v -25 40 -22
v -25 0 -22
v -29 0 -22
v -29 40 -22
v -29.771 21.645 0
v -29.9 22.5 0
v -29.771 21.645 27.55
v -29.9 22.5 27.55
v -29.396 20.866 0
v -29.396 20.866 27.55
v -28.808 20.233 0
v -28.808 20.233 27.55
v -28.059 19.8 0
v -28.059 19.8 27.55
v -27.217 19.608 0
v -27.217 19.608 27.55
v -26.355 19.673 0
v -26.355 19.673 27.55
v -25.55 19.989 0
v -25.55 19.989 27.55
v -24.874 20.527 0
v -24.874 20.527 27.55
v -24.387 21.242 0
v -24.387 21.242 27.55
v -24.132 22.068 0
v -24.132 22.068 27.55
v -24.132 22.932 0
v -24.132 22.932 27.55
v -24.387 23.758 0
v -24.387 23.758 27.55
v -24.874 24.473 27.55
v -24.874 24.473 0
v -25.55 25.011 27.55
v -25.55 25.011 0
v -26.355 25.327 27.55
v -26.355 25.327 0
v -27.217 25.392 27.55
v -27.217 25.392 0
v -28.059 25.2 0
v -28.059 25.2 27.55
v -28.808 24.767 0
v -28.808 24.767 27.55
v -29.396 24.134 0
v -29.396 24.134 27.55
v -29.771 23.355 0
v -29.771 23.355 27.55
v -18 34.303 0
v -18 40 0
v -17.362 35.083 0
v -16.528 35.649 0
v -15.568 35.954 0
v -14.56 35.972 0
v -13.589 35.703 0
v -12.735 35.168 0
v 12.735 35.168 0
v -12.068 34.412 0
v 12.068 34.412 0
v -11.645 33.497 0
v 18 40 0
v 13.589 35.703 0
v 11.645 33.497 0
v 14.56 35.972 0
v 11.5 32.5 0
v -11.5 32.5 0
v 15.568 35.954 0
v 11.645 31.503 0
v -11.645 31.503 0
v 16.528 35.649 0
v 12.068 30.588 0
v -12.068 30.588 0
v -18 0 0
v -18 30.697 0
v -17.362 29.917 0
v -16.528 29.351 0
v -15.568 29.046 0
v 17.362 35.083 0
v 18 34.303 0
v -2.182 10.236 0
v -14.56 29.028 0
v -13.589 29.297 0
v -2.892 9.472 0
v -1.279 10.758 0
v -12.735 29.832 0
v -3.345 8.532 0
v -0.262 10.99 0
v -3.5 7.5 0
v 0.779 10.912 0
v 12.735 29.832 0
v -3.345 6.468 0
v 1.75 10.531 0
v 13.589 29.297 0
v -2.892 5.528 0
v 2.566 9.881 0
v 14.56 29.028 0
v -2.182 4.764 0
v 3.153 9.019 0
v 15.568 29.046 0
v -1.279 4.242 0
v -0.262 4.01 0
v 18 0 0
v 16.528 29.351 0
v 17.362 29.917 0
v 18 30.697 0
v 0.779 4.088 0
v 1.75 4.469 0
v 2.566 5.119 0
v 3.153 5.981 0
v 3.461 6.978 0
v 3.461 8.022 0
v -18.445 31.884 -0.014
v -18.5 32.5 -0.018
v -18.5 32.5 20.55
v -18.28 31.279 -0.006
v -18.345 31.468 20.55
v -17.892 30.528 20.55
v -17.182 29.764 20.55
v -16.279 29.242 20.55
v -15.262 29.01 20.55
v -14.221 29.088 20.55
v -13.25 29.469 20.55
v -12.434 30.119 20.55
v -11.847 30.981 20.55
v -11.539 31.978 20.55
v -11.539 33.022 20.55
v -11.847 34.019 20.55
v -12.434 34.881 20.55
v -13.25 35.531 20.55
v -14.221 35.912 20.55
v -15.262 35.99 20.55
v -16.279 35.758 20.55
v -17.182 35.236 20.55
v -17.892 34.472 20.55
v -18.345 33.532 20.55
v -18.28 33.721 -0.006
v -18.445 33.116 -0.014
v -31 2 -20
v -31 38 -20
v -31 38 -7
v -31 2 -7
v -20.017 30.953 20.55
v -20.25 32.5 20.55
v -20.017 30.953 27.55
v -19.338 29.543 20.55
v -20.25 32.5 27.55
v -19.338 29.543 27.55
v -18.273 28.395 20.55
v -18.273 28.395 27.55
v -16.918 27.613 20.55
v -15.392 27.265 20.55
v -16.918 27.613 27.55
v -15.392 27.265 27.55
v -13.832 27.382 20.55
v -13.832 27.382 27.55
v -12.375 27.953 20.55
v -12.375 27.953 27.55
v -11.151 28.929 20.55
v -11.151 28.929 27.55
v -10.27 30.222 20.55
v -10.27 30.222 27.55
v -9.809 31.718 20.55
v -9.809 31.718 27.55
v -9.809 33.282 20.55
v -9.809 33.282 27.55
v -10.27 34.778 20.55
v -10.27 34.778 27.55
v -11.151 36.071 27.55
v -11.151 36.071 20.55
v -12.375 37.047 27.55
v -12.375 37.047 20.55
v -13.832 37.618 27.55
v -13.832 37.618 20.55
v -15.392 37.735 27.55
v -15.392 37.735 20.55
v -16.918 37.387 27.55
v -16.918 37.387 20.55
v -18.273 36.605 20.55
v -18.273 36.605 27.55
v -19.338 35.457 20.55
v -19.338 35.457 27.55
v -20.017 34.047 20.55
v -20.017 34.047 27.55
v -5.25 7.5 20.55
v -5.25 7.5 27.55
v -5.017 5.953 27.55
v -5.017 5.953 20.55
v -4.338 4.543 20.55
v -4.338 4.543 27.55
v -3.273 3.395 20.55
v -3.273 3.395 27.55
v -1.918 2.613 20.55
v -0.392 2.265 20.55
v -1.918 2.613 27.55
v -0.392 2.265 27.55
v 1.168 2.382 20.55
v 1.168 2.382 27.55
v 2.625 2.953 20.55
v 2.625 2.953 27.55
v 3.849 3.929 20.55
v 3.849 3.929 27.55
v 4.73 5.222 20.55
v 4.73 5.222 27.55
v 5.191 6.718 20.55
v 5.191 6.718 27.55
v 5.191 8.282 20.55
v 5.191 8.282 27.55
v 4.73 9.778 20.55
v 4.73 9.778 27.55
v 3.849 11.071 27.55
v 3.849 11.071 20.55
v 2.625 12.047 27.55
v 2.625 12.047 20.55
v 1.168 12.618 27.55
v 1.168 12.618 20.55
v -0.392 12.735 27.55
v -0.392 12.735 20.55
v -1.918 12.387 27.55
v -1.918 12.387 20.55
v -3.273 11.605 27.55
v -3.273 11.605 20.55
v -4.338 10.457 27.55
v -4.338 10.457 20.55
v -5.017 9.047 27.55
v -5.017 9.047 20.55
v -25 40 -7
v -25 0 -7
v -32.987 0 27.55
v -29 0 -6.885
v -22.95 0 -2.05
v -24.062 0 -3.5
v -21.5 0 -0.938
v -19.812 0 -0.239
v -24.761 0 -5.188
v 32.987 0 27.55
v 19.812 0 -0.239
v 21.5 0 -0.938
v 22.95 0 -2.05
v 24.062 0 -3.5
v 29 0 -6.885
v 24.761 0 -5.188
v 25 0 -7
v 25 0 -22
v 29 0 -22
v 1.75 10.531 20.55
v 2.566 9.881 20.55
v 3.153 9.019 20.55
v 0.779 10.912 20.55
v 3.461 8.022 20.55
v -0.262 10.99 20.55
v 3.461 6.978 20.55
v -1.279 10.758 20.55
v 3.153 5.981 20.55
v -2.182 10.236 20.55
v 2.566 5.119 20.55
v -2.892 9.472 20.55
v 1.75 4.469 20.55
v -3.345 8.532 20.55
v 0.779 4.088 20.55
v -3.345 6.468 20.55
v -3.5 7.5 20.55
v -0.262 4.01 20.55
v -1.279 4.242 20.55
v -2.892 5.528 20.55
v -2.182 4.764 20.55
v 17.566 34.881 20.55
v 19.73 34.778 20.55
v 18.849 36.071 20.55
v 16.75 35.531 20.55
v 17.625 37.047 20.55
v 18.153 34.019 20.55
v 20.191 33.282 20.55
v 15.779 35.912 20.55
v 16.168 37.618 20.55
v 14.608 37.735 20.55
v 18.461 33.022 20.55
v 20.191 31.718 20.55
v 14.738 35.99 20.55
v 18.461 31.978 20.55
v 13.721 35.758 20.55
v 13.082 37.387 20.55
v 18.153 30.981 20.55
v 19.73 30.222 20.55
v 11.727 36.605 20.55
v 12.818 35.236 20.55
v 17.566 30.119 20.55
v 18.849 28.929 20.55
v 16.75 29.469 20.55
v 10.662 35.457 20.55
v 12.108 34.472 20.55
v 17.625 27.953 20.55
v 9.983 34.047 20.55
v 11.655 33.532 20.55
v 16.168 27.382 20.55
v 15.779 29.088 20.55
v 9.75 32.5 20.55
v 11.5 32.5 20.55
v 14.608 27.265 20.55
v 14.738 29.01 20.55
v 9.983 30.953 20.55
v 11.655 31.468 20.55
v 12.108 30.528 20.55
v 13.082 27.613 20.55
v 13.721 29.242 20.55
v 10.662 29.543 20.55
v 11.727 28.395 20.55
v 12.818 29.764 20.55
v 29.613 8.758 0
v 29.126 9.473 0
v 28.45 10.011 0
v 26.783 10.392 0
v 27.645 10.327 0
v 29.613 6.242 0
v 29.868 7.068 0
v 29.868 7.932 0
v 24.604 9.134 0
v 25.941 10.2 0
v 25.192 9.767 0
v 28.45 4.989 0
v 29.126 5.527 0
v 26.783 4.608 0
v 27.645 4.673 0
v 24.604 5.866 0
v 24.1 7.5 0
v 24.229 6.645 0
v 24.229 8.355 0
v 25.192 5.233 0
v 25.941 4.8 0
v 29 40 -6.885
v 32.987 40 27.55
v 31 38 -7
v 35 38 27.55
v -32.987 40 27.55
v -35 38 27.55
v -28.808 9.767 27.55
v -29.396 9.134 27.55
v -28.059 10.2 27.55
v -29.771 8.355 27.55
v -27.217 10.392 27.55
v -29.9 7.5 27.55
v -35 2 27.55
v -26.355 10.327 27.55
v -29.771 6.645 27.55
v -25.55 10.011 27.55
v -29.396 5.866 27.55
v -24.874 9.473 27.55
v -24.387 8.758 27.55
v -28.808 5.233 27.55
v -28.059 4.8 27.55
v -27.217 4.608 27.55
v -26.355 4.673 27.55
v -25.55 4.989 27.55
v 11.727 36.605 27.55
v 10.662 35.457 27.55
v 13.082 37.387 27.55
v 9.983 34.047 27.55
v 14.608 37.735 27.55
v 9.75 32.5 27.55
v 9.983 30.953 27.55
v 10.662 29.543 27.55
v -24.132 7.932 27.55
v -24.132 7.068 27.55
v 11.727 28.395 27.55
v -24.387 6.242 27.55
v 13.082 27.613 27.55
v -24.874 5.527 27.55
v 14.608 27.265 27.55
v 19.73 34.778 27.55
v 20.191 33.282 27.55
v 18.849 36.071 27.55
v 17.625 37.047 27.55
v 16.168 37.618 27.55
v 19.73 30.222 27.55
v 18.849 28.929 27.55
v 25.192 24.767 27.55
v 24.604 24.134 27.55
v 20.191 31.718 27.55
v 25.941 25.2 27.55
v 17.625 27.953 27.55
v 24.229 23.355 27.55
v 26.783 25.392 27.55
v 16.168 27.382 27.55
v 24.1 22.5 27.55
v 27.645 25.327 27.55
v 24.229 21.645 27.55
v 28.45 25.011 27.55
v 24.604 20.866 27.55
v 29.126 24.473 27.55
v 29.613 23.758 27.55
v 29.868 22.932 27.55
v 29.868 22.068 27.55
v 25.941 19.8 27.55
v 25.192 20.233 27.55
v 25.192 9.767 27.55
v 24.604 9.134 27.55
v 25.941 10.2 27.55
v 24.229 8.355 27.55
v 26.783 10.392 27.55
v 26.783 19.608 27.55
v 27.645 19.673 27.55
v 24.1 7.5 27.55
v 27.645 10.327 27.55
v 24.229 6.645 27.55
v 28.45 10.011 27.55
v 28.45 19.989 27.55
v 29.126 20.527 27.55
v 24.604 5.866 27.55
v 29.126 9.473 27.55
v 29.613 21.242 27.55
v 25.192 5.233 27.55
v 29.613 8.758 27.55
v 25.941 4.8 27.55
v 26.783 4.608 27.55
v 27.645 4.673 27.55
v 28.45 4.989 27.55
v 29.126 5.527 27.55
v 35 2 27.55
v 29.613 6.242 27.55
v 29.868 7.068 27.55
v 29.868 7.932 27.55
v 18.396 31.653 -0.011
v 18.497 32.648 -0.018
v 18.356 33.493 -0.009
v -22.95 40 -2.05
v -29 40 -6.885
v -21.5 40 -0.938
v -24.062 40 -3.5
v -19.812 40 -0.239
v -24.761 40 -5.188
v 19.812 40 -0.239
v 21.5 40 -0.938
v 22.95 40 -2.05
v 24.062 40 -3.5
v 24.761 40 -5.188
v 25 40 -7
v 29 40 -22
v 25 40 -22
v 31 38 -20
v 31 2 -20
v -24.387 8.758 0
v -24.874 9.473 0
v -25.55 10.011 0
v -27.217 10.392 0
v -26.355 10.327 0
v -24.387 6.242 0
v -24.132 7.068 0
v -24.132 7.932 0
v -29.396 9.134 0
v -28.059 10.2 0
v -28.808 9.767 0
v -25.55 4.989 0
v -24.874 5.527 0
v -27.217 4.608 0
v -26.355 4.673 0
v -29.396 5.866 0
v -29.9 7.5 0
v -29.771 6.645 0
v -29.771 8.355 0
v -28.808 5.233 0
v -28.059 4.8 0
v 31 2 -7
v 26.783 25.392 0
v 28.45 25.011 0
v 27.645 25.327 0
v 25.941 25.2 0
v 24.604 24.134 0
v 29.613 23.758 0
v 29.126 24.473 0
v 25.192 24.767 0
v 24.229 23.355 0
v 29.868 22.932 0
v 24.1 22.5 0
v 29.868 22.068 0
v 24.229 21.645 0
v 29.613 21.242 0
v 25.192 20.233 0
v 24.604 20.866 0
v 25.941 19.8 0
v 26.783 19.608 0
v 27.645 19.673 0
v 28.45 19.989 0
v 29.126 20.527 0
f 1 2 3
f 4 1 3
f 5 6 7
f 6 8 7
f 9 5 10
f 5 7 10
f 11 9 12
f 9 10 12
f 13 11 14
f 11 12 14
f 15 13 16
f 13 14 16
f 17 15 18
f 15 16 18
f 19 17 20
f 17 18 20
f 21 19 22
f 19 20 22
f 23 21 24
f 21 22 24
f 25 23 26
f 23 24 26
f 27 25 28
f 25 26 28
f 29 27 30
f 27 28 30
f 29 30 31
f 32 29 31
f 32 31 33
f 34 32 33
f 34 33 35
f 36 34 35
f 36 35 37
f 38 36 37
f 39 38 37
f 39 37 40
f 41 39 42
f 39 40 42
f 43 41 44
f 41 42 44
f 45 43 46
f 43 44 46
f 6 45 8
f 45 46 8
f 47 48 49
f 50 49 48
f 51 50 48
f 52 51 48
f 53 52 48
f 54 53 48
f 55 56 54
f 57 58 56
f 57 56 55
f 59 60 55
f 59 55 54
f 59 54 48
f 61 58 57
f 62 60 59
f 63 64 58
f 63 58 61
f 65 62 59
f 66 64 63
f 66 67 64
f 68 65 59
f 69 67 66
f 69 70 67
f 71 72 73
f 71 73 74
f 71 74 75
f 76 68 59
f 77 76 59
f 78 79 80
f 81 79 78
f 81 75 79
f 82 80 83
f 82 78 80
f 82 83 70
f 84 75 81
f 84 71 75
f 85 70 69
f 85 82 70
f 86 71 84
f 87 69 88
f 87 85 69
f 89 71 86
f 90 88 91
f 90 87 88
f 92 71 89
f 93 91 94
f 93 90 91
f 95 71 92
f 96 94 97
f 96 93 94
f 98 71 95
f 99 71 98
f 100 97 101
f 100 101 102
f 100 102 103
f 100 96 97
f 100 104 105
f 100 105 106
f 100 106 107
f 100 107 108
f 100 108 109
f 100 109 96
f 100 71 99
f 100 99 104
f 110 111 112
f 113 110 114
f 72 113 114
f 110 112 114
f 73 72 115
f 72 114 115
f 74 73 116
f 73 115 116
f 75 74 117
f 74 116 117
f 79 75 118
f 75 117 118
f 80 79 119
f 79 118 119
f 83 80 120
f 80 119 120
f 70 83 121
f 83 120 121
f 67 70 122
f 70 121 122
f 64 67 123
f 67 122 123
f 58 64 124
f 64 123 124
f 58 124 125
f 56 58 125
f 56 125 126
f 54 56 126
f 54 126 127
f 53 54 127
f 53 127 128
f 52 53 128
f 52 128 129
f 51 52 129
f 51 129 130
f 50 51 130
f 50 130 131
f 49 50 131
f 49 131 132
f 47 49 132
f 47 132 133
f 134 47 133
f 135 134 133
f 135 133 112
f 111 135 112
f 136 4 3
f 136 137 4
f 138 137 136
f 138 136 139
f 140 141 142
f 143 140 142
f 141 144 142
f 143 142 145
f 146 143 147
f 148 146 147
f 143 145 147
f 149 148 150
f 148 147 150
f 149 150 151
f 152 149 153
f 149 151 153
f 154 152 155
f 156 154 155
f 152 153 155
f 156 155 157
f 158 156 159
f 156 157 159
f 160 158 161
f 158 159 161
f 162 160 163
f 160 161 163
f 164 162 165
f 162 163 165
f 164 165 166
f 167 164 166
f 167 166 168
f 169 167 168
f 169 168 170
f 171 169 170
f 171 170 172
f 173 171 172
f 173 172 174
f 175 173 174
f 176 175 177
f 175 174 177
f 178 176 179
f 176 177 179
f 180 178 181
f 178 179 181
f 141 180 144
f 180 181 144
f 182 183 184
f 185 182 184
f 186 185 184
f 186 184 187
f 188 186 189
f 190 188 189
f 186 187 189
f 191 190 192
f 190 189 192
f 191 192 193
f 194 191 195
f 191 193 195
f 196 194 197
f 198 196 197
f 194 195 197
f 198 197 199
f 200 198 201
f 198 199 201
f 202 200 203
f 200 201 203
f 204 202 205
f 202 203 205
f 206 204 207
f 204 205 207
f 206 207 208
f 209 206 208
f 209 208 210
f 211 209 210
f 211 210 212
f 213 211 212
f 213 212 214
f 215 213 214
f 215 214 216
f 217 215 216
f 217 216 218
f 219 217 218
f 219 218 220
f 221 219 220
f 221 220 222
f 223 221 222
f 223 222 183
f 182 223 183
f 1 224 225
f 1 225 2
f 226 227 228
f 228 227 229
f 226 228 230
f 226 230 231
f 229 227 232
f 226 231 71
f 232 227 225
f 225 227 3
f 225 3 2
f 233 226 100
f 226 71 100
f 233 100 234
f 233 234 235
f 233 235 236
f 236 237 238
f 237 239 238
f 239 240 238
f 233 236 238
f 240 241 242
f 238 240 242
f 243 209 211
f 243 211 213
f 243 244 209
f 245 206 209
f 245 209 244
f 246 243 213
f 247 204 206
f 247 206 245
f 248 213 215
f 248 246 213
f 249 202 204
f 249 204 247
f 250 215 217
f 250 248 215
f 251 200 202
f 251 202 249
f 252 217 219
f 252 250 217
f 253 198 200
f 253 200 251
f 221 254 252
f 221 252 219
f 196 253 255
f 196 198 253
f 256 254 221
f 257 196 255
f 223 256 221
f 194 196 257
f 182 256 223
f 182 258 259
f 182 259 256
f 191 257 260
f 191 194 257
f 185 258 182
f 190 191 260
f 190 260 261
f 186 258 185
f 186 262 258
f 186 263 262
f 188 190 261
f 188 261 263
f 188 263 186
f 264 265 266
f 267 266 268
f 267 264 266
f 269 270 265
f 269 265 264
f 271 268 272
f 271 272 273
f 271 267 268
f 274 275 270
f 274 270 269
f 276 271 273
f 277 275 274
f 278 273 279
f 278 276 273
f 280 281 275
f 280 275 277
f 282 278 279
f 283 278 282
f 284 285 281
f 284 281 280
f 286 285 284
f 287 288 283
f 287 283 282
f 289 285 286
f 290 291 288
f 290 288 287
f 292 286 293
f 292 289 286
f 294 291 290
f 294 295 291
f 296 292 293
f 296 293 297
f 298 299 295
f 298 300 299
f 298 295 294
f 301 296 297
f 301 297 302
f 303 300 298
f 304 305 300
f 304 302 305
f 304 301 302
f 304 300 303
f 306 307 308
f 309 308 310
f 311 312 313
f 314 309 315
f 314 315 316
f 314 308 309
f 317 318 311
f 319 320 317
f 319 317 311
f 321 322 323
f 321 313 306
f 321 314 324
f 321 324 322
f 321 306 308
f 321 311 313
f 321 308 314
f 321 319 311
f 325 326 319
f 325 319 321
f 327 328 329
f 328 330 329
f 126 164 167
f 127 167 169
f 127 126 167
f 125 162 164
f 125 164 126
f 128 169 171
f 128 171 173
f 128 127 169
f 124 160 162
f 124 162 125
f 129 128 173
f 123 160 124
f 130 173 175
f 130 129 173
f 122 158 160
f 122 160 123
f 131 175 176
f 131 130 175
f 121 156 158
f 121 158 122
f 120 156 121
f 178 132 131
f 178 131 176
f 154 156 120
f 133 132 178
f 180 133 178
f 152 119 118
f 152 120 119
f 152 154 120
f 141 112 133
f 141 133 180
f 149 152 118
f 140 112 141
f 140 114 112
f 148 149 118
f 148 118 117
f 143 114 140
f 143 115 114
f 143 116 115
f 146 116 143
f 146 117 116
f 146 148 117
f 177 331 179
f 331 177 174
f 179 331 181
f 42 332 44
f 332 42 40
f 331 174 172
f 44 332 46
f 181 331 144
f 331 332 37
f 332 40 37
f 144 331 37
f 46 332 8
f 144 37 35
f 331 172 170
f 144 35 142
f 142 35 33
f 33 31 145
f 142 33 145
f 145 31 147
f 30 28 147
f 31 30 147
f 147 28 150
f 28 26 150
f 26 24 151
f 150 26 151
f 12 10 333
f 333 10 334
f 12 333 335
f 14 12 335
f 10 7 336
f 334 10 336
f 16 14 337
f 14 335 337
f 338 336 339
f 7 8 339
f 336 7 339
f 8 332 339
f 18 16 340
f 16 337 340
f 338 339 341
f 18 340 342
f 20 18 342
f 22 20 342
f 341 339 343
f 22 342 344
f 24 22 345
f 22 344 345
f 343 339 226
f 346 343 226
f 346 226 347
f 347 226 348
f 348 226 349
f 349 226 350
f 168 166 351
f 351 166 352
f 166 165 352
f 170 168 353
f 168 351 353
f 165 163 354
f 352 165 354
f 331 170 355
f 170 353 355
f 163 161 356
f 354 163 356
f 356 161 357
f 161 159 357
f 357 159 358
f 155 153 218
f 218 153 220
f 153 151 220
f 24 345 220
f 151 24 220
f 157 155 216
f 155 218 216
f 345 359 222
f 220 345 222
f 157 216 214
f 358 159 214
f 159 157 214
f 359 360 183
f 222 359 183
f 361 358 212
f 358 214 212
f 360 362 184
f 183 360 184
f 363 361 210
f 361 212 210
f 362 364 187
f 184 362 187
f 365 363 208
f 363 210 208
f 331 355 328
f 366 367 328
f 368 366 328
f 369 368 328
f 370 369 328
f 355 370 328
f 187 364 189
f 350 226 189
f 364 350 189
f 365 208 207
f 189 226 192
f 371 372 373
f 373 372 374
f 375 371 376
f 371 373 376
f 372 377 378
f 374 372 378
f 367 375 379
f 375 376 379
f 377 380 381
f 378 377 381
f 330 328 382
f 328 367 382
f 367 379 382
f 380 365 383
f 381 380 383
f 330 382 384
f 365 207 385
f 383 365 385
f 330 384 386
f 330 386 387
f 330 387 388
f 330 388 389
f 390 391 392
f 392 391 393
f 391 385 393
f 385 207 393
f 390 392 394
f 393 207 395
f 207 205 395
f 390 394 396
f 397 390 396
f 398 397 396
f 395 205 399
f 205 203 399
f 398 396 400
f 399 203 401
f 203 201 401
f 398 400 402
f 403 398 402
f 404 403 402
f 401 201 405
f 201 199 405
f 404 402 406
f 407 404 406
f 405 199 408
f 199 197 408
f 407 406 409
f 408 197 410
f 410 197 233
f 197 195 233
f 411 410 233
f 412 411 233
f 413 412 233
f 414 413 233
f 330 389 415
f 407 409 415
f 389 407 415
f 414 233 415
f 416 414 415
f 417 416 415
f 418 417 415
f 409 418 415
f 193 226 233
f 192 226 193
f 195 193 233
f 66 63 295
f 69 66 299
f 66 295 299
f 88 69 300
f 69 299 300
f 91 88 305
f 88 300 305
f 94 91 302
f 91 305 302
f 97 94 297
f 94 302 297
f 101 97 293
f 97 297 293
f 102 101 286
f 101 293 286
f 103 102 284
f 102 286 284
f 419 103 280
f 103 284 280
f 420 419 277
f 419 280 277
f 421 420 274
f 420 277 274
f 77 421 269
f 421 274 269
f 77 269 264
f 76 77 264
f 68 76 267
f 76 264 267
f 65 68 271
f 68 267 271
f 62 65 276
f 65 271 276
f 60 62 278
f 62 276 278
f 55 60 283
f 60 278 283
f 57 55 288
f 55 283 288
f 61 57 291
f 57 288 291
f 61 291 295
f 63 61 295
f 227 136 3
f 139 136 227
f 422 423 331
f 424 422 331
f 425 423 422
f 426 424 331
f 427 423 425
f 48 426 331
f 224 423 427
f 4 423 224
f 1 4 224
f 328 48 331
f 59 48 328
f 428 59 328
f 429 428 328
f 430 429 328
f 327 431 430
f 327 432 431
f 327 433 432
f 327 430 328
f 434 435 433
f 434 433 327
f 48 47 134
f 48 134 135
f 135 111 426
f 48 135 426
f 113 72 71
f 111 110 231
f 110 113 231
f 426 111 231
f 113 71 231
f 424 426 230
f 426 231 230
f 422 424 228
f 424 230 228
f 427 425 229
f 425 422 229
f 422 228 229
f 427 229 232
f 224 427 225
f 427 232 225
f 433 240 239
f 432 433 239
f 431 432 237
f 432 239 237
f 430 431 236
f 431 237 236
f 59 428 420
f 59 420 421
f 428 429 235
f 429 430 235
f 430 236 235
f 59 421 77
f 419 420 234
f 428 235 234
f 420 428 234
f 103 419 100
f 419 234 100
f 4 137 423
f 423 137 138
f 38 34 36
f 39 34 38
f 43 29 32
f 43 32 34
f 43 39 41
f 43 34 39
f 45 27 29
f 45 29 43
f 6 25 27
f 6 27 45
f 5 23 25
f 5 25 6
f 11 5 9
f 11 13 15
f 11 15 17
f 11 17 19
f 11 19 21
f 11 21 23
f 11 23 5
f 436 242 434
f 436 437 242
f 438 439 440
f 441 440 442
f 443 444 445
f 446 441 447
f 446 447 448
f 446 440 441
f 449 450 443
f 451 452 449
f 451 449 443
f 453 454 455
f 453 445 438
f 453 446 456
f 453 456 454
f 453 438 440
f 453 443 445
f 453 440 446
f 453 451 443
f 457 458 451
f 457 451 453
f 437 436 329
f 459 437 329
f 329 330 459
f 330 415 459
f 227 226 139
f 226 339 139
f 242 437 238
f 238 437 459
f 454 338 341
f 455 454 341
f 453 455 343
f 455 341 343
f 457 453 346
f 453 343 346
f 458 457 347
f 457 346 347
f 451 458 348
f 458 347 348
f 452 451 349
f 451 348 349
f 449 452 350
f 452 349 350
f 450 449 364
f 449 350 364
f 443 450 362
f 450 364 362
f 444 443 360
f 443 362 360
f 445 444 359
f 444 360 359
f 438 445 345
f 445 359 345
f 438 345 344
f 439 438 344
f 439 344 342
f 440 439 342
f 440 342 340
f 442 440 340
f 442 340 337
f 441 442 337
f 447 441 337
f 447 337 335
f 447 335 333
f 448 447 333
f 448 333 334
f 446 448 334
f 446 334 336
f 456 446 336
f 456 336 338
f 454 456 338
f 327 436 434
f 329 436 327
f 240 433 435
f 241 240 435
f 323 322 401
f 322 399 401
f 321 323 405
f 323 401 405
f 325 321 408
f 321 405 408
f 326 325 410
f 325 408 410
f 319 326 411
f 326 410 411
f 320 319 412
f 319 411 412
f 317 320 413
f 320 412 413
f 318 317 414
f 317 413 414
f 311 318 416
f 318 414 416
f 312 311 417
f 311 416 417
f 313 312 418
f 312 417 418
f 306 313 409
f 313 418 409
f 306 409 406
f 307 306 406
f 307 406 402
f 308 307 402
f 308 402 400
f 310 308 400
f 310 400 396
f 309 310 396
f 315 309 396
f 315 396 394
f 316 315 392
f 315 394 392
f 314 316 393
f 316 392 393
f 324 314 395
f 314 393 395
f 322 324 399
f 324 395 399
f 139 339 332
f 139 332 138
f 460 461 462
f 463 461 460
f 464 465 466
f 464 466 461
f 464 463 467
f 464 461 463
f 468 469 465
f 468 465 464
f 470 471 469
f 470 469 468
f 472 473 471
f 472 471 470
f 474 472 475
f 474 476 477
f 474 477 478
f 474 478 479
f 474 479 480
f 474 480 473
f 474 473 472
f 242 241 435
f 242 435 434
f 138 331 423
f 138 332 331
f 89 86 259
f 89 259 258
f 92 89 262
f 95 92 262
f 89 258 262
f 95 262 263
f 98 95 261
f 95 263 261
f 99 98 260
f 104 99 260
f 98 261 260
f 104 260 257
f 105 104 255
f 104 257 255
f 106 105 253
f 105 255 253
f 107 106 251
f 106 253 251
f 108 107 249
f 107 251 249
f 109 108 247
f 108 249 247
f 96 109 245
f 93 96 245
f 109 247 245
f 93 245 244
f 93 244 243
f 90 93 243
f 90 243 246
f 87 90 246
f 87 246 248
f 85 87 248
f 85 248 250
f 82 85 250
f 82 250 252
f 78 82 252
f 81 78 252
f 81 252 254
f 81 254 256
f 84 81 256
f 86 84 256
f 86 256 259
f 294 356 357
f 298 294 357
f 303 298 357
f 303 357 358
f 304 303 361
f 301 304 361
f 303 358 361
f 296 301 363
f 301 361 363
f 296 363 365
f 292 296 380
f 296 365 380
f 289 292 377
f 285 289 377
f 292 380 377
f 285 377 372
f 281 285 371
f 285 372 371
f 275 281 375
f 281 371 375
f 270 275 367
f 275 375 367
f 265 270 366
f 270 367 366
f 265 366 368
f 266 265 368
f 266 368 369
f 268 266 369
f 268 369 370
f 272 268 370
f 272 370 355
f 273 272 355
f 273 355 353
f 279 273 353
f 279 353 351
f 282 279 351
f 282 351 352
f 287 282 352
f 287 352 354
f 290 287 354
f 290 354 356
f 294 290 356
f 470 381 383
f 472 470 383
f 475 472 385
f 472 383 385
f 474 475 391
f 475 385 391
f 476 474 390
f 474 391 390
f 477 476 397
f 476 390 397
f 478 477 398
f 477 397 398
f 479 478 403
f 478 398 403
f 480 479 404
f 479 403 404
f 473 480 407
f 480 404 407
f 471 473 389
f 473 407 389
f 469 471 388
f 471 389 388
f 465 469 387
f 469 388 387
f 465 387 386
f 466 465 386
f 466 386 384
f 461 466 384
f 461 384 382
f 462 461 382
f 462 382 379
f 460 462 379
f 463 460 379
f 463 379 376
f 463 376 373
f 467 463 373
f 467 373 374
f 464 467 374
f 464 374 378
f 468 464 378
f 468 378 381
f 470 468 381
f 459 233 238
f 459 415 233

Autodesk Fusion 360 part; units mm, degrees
sketch "Sketch1" plane through (0, 0, 0) normal (0, 1, 0) x (1, 0, 0)
  line L0 (0, 0) -> (18, 0)
  line L1 (0, 0) -> (-18, 0)
  line L2 (25, 7) -> (25, 22)
  line L3 (-25, 7) -> (-25, 22)
  line L4 (25, 22) -> (31, 22)
  line L5 (-25, 22) -> (-31, 22)
  line L6 (0, 0) -> (0, -27.55) construction
  line L7 (0, -27.55) -> (35, -27.55)
  line L8 (0, -27.55) -> (-35, -27.55)
  line L9 (31, 22) -> (31, 7)
  line L10 (-31, 22) -> (-31, 7)
  line L11 (-35, -27.55) -> (-31, 7)
  line L12 (35, -27.55) -> (31, 7)
  arc A0 (-25, 7) -> (-18, 0) centre (-18, 7) ccw
  arc A1 (18, 0) -> (25, 7) centre (18, 7) ccw
  point P0 (25, 0)
  point P1 (-25, 0)
  dimension "d5" = 25
  dimension "d6" = 25
  dimension "d7" = 22
  dimension "d8" = 22
  dimension "d9" = 6
  dimension "d10" = 6
  dimension "d11" = 27.55
  dimension "d12" = 35
  dimension "d13" = 35
  dimension "d14" = 15
  dimension "d15" = 15
  dimension "d16" = 7
  dimension "d17" = 7
extrude "Extrude1" add sketch "Sketch1" along normal blind 40
sketch "Sketch2" plane through (0, 0, 27.55) normal (0, 0, 1) x (-1, 0, 0)
  line L0 (35, 0) -> (-35, 0)
  line L1 (-35, 0) -> (-35, -40)
  line L2 (-35, -40) -> (35, -40)
  line L3 (35, -40) -> (35, 0)
  line L4 (0, -40) -> (0, -32.5) construction
  line L5 (0, 0) -> (0, -7.5) construction
  line L6 (0, -32.5) -> (-15, -32.5) construction
  line L7 (0, -32.5) -> (15, -32.5) construction
  circle A0 centre (15, -32.5) radius 3.5
  circle A1 centre (15, -32.5) radius 5.25
  circle A2 centre (-15, -32.5) radius 3.5
  circle A3 centre (-15, -32.5) radius 5.25
  circle A4 centre (0, -7.5) radius 3.5
  circle A5 centre (0, -7.5) radius 5.25
  line L8 (-35, 0) -> (-27, 0) construction
  line L9 (-27, 0) -> (-27, -7.5) construction
  line L10 (-27, -7.5) -> (-35, -7.5) construction
  line L11 (-35, -7.5) -> (-35, 0) construction
  line L12 (35, 0) -> (27, 0) construction
  line L13 (27, 0) -> (27, -7.5) construction
  line L14 (27, -7.5) -> (35, -7.5) construction
  line L15 (35, -7.5) -> (35, 0) construction
  line L16 (-27, -7.5) -> (-27, -22.5) construction
  line L17 (27, -7.5) -> (27, -22.5) construction
  circle A6 centre (-27, -22.5) radius 2.9
  circle A7 centre (-27, -7.5) radius 2.9
  circle A8 centre (27, -7.5) radius 2.9
  circle A9 centre (27, -22.5) radius 2.9
  dimension "d20" = 7.5
  dimension "d21" = 7.5
  dimension "d22" = 15
  dimension "d23" = 15
  dimension "d24" = 7
  dimension "d25" = 10.5
  dimension "d26" = 7
  dimension "d27" = 10.5
  dimension "d28" = 7
  dimension "d29" = 10.5
  dimension "d30" = 8
  dimension "d31" = 7.5
  dimension "d32" = 8
  dimension "d33" = 7.5
  dimension "d34" = 15
  dimension "d35" = 15
  dimension "d36" = 5.8
  dimension "d37" = 5.8
  dimension "d38" = 5.8
  dimension "d39" = 5.8
extrude "Extrude4" cut sketch "Sketch2" against normal through all contours A0 | A2 | A4
extrude "Extrude3" cut sketch "Sketch2" against normal blind 7 contours A1 | A3 | A5
extrude "Extrude2" cut sketch "Sketch2" against normal up to surface (27.55 mm away) contours A6 | A7 | A8 | A9
chamfer "Chamfer1" distance 2 angle 45 8 edges at (33, 0, 10.275) (31, 0, -14.5) (-31, 0, -14.5) (-33, 0, 10.275) (-31, 40, -14.5) (-33, 40, 10.275) (33, 40, 10.275) (31, 40, -14.5)
chamfer "Chamfer2" distance 2 angle 45 2 edges at (-31, 20, -22) (31, 20, -22)
equation "steelRadius = 7 mm"
equation "steelNarrow = 50 mm"
equation "d5 = steelNarrow / 2"
equation "d6 = steelNarrow / 2"
equation "d16 = steelRadius"
equation "d17 = steelRadius"
